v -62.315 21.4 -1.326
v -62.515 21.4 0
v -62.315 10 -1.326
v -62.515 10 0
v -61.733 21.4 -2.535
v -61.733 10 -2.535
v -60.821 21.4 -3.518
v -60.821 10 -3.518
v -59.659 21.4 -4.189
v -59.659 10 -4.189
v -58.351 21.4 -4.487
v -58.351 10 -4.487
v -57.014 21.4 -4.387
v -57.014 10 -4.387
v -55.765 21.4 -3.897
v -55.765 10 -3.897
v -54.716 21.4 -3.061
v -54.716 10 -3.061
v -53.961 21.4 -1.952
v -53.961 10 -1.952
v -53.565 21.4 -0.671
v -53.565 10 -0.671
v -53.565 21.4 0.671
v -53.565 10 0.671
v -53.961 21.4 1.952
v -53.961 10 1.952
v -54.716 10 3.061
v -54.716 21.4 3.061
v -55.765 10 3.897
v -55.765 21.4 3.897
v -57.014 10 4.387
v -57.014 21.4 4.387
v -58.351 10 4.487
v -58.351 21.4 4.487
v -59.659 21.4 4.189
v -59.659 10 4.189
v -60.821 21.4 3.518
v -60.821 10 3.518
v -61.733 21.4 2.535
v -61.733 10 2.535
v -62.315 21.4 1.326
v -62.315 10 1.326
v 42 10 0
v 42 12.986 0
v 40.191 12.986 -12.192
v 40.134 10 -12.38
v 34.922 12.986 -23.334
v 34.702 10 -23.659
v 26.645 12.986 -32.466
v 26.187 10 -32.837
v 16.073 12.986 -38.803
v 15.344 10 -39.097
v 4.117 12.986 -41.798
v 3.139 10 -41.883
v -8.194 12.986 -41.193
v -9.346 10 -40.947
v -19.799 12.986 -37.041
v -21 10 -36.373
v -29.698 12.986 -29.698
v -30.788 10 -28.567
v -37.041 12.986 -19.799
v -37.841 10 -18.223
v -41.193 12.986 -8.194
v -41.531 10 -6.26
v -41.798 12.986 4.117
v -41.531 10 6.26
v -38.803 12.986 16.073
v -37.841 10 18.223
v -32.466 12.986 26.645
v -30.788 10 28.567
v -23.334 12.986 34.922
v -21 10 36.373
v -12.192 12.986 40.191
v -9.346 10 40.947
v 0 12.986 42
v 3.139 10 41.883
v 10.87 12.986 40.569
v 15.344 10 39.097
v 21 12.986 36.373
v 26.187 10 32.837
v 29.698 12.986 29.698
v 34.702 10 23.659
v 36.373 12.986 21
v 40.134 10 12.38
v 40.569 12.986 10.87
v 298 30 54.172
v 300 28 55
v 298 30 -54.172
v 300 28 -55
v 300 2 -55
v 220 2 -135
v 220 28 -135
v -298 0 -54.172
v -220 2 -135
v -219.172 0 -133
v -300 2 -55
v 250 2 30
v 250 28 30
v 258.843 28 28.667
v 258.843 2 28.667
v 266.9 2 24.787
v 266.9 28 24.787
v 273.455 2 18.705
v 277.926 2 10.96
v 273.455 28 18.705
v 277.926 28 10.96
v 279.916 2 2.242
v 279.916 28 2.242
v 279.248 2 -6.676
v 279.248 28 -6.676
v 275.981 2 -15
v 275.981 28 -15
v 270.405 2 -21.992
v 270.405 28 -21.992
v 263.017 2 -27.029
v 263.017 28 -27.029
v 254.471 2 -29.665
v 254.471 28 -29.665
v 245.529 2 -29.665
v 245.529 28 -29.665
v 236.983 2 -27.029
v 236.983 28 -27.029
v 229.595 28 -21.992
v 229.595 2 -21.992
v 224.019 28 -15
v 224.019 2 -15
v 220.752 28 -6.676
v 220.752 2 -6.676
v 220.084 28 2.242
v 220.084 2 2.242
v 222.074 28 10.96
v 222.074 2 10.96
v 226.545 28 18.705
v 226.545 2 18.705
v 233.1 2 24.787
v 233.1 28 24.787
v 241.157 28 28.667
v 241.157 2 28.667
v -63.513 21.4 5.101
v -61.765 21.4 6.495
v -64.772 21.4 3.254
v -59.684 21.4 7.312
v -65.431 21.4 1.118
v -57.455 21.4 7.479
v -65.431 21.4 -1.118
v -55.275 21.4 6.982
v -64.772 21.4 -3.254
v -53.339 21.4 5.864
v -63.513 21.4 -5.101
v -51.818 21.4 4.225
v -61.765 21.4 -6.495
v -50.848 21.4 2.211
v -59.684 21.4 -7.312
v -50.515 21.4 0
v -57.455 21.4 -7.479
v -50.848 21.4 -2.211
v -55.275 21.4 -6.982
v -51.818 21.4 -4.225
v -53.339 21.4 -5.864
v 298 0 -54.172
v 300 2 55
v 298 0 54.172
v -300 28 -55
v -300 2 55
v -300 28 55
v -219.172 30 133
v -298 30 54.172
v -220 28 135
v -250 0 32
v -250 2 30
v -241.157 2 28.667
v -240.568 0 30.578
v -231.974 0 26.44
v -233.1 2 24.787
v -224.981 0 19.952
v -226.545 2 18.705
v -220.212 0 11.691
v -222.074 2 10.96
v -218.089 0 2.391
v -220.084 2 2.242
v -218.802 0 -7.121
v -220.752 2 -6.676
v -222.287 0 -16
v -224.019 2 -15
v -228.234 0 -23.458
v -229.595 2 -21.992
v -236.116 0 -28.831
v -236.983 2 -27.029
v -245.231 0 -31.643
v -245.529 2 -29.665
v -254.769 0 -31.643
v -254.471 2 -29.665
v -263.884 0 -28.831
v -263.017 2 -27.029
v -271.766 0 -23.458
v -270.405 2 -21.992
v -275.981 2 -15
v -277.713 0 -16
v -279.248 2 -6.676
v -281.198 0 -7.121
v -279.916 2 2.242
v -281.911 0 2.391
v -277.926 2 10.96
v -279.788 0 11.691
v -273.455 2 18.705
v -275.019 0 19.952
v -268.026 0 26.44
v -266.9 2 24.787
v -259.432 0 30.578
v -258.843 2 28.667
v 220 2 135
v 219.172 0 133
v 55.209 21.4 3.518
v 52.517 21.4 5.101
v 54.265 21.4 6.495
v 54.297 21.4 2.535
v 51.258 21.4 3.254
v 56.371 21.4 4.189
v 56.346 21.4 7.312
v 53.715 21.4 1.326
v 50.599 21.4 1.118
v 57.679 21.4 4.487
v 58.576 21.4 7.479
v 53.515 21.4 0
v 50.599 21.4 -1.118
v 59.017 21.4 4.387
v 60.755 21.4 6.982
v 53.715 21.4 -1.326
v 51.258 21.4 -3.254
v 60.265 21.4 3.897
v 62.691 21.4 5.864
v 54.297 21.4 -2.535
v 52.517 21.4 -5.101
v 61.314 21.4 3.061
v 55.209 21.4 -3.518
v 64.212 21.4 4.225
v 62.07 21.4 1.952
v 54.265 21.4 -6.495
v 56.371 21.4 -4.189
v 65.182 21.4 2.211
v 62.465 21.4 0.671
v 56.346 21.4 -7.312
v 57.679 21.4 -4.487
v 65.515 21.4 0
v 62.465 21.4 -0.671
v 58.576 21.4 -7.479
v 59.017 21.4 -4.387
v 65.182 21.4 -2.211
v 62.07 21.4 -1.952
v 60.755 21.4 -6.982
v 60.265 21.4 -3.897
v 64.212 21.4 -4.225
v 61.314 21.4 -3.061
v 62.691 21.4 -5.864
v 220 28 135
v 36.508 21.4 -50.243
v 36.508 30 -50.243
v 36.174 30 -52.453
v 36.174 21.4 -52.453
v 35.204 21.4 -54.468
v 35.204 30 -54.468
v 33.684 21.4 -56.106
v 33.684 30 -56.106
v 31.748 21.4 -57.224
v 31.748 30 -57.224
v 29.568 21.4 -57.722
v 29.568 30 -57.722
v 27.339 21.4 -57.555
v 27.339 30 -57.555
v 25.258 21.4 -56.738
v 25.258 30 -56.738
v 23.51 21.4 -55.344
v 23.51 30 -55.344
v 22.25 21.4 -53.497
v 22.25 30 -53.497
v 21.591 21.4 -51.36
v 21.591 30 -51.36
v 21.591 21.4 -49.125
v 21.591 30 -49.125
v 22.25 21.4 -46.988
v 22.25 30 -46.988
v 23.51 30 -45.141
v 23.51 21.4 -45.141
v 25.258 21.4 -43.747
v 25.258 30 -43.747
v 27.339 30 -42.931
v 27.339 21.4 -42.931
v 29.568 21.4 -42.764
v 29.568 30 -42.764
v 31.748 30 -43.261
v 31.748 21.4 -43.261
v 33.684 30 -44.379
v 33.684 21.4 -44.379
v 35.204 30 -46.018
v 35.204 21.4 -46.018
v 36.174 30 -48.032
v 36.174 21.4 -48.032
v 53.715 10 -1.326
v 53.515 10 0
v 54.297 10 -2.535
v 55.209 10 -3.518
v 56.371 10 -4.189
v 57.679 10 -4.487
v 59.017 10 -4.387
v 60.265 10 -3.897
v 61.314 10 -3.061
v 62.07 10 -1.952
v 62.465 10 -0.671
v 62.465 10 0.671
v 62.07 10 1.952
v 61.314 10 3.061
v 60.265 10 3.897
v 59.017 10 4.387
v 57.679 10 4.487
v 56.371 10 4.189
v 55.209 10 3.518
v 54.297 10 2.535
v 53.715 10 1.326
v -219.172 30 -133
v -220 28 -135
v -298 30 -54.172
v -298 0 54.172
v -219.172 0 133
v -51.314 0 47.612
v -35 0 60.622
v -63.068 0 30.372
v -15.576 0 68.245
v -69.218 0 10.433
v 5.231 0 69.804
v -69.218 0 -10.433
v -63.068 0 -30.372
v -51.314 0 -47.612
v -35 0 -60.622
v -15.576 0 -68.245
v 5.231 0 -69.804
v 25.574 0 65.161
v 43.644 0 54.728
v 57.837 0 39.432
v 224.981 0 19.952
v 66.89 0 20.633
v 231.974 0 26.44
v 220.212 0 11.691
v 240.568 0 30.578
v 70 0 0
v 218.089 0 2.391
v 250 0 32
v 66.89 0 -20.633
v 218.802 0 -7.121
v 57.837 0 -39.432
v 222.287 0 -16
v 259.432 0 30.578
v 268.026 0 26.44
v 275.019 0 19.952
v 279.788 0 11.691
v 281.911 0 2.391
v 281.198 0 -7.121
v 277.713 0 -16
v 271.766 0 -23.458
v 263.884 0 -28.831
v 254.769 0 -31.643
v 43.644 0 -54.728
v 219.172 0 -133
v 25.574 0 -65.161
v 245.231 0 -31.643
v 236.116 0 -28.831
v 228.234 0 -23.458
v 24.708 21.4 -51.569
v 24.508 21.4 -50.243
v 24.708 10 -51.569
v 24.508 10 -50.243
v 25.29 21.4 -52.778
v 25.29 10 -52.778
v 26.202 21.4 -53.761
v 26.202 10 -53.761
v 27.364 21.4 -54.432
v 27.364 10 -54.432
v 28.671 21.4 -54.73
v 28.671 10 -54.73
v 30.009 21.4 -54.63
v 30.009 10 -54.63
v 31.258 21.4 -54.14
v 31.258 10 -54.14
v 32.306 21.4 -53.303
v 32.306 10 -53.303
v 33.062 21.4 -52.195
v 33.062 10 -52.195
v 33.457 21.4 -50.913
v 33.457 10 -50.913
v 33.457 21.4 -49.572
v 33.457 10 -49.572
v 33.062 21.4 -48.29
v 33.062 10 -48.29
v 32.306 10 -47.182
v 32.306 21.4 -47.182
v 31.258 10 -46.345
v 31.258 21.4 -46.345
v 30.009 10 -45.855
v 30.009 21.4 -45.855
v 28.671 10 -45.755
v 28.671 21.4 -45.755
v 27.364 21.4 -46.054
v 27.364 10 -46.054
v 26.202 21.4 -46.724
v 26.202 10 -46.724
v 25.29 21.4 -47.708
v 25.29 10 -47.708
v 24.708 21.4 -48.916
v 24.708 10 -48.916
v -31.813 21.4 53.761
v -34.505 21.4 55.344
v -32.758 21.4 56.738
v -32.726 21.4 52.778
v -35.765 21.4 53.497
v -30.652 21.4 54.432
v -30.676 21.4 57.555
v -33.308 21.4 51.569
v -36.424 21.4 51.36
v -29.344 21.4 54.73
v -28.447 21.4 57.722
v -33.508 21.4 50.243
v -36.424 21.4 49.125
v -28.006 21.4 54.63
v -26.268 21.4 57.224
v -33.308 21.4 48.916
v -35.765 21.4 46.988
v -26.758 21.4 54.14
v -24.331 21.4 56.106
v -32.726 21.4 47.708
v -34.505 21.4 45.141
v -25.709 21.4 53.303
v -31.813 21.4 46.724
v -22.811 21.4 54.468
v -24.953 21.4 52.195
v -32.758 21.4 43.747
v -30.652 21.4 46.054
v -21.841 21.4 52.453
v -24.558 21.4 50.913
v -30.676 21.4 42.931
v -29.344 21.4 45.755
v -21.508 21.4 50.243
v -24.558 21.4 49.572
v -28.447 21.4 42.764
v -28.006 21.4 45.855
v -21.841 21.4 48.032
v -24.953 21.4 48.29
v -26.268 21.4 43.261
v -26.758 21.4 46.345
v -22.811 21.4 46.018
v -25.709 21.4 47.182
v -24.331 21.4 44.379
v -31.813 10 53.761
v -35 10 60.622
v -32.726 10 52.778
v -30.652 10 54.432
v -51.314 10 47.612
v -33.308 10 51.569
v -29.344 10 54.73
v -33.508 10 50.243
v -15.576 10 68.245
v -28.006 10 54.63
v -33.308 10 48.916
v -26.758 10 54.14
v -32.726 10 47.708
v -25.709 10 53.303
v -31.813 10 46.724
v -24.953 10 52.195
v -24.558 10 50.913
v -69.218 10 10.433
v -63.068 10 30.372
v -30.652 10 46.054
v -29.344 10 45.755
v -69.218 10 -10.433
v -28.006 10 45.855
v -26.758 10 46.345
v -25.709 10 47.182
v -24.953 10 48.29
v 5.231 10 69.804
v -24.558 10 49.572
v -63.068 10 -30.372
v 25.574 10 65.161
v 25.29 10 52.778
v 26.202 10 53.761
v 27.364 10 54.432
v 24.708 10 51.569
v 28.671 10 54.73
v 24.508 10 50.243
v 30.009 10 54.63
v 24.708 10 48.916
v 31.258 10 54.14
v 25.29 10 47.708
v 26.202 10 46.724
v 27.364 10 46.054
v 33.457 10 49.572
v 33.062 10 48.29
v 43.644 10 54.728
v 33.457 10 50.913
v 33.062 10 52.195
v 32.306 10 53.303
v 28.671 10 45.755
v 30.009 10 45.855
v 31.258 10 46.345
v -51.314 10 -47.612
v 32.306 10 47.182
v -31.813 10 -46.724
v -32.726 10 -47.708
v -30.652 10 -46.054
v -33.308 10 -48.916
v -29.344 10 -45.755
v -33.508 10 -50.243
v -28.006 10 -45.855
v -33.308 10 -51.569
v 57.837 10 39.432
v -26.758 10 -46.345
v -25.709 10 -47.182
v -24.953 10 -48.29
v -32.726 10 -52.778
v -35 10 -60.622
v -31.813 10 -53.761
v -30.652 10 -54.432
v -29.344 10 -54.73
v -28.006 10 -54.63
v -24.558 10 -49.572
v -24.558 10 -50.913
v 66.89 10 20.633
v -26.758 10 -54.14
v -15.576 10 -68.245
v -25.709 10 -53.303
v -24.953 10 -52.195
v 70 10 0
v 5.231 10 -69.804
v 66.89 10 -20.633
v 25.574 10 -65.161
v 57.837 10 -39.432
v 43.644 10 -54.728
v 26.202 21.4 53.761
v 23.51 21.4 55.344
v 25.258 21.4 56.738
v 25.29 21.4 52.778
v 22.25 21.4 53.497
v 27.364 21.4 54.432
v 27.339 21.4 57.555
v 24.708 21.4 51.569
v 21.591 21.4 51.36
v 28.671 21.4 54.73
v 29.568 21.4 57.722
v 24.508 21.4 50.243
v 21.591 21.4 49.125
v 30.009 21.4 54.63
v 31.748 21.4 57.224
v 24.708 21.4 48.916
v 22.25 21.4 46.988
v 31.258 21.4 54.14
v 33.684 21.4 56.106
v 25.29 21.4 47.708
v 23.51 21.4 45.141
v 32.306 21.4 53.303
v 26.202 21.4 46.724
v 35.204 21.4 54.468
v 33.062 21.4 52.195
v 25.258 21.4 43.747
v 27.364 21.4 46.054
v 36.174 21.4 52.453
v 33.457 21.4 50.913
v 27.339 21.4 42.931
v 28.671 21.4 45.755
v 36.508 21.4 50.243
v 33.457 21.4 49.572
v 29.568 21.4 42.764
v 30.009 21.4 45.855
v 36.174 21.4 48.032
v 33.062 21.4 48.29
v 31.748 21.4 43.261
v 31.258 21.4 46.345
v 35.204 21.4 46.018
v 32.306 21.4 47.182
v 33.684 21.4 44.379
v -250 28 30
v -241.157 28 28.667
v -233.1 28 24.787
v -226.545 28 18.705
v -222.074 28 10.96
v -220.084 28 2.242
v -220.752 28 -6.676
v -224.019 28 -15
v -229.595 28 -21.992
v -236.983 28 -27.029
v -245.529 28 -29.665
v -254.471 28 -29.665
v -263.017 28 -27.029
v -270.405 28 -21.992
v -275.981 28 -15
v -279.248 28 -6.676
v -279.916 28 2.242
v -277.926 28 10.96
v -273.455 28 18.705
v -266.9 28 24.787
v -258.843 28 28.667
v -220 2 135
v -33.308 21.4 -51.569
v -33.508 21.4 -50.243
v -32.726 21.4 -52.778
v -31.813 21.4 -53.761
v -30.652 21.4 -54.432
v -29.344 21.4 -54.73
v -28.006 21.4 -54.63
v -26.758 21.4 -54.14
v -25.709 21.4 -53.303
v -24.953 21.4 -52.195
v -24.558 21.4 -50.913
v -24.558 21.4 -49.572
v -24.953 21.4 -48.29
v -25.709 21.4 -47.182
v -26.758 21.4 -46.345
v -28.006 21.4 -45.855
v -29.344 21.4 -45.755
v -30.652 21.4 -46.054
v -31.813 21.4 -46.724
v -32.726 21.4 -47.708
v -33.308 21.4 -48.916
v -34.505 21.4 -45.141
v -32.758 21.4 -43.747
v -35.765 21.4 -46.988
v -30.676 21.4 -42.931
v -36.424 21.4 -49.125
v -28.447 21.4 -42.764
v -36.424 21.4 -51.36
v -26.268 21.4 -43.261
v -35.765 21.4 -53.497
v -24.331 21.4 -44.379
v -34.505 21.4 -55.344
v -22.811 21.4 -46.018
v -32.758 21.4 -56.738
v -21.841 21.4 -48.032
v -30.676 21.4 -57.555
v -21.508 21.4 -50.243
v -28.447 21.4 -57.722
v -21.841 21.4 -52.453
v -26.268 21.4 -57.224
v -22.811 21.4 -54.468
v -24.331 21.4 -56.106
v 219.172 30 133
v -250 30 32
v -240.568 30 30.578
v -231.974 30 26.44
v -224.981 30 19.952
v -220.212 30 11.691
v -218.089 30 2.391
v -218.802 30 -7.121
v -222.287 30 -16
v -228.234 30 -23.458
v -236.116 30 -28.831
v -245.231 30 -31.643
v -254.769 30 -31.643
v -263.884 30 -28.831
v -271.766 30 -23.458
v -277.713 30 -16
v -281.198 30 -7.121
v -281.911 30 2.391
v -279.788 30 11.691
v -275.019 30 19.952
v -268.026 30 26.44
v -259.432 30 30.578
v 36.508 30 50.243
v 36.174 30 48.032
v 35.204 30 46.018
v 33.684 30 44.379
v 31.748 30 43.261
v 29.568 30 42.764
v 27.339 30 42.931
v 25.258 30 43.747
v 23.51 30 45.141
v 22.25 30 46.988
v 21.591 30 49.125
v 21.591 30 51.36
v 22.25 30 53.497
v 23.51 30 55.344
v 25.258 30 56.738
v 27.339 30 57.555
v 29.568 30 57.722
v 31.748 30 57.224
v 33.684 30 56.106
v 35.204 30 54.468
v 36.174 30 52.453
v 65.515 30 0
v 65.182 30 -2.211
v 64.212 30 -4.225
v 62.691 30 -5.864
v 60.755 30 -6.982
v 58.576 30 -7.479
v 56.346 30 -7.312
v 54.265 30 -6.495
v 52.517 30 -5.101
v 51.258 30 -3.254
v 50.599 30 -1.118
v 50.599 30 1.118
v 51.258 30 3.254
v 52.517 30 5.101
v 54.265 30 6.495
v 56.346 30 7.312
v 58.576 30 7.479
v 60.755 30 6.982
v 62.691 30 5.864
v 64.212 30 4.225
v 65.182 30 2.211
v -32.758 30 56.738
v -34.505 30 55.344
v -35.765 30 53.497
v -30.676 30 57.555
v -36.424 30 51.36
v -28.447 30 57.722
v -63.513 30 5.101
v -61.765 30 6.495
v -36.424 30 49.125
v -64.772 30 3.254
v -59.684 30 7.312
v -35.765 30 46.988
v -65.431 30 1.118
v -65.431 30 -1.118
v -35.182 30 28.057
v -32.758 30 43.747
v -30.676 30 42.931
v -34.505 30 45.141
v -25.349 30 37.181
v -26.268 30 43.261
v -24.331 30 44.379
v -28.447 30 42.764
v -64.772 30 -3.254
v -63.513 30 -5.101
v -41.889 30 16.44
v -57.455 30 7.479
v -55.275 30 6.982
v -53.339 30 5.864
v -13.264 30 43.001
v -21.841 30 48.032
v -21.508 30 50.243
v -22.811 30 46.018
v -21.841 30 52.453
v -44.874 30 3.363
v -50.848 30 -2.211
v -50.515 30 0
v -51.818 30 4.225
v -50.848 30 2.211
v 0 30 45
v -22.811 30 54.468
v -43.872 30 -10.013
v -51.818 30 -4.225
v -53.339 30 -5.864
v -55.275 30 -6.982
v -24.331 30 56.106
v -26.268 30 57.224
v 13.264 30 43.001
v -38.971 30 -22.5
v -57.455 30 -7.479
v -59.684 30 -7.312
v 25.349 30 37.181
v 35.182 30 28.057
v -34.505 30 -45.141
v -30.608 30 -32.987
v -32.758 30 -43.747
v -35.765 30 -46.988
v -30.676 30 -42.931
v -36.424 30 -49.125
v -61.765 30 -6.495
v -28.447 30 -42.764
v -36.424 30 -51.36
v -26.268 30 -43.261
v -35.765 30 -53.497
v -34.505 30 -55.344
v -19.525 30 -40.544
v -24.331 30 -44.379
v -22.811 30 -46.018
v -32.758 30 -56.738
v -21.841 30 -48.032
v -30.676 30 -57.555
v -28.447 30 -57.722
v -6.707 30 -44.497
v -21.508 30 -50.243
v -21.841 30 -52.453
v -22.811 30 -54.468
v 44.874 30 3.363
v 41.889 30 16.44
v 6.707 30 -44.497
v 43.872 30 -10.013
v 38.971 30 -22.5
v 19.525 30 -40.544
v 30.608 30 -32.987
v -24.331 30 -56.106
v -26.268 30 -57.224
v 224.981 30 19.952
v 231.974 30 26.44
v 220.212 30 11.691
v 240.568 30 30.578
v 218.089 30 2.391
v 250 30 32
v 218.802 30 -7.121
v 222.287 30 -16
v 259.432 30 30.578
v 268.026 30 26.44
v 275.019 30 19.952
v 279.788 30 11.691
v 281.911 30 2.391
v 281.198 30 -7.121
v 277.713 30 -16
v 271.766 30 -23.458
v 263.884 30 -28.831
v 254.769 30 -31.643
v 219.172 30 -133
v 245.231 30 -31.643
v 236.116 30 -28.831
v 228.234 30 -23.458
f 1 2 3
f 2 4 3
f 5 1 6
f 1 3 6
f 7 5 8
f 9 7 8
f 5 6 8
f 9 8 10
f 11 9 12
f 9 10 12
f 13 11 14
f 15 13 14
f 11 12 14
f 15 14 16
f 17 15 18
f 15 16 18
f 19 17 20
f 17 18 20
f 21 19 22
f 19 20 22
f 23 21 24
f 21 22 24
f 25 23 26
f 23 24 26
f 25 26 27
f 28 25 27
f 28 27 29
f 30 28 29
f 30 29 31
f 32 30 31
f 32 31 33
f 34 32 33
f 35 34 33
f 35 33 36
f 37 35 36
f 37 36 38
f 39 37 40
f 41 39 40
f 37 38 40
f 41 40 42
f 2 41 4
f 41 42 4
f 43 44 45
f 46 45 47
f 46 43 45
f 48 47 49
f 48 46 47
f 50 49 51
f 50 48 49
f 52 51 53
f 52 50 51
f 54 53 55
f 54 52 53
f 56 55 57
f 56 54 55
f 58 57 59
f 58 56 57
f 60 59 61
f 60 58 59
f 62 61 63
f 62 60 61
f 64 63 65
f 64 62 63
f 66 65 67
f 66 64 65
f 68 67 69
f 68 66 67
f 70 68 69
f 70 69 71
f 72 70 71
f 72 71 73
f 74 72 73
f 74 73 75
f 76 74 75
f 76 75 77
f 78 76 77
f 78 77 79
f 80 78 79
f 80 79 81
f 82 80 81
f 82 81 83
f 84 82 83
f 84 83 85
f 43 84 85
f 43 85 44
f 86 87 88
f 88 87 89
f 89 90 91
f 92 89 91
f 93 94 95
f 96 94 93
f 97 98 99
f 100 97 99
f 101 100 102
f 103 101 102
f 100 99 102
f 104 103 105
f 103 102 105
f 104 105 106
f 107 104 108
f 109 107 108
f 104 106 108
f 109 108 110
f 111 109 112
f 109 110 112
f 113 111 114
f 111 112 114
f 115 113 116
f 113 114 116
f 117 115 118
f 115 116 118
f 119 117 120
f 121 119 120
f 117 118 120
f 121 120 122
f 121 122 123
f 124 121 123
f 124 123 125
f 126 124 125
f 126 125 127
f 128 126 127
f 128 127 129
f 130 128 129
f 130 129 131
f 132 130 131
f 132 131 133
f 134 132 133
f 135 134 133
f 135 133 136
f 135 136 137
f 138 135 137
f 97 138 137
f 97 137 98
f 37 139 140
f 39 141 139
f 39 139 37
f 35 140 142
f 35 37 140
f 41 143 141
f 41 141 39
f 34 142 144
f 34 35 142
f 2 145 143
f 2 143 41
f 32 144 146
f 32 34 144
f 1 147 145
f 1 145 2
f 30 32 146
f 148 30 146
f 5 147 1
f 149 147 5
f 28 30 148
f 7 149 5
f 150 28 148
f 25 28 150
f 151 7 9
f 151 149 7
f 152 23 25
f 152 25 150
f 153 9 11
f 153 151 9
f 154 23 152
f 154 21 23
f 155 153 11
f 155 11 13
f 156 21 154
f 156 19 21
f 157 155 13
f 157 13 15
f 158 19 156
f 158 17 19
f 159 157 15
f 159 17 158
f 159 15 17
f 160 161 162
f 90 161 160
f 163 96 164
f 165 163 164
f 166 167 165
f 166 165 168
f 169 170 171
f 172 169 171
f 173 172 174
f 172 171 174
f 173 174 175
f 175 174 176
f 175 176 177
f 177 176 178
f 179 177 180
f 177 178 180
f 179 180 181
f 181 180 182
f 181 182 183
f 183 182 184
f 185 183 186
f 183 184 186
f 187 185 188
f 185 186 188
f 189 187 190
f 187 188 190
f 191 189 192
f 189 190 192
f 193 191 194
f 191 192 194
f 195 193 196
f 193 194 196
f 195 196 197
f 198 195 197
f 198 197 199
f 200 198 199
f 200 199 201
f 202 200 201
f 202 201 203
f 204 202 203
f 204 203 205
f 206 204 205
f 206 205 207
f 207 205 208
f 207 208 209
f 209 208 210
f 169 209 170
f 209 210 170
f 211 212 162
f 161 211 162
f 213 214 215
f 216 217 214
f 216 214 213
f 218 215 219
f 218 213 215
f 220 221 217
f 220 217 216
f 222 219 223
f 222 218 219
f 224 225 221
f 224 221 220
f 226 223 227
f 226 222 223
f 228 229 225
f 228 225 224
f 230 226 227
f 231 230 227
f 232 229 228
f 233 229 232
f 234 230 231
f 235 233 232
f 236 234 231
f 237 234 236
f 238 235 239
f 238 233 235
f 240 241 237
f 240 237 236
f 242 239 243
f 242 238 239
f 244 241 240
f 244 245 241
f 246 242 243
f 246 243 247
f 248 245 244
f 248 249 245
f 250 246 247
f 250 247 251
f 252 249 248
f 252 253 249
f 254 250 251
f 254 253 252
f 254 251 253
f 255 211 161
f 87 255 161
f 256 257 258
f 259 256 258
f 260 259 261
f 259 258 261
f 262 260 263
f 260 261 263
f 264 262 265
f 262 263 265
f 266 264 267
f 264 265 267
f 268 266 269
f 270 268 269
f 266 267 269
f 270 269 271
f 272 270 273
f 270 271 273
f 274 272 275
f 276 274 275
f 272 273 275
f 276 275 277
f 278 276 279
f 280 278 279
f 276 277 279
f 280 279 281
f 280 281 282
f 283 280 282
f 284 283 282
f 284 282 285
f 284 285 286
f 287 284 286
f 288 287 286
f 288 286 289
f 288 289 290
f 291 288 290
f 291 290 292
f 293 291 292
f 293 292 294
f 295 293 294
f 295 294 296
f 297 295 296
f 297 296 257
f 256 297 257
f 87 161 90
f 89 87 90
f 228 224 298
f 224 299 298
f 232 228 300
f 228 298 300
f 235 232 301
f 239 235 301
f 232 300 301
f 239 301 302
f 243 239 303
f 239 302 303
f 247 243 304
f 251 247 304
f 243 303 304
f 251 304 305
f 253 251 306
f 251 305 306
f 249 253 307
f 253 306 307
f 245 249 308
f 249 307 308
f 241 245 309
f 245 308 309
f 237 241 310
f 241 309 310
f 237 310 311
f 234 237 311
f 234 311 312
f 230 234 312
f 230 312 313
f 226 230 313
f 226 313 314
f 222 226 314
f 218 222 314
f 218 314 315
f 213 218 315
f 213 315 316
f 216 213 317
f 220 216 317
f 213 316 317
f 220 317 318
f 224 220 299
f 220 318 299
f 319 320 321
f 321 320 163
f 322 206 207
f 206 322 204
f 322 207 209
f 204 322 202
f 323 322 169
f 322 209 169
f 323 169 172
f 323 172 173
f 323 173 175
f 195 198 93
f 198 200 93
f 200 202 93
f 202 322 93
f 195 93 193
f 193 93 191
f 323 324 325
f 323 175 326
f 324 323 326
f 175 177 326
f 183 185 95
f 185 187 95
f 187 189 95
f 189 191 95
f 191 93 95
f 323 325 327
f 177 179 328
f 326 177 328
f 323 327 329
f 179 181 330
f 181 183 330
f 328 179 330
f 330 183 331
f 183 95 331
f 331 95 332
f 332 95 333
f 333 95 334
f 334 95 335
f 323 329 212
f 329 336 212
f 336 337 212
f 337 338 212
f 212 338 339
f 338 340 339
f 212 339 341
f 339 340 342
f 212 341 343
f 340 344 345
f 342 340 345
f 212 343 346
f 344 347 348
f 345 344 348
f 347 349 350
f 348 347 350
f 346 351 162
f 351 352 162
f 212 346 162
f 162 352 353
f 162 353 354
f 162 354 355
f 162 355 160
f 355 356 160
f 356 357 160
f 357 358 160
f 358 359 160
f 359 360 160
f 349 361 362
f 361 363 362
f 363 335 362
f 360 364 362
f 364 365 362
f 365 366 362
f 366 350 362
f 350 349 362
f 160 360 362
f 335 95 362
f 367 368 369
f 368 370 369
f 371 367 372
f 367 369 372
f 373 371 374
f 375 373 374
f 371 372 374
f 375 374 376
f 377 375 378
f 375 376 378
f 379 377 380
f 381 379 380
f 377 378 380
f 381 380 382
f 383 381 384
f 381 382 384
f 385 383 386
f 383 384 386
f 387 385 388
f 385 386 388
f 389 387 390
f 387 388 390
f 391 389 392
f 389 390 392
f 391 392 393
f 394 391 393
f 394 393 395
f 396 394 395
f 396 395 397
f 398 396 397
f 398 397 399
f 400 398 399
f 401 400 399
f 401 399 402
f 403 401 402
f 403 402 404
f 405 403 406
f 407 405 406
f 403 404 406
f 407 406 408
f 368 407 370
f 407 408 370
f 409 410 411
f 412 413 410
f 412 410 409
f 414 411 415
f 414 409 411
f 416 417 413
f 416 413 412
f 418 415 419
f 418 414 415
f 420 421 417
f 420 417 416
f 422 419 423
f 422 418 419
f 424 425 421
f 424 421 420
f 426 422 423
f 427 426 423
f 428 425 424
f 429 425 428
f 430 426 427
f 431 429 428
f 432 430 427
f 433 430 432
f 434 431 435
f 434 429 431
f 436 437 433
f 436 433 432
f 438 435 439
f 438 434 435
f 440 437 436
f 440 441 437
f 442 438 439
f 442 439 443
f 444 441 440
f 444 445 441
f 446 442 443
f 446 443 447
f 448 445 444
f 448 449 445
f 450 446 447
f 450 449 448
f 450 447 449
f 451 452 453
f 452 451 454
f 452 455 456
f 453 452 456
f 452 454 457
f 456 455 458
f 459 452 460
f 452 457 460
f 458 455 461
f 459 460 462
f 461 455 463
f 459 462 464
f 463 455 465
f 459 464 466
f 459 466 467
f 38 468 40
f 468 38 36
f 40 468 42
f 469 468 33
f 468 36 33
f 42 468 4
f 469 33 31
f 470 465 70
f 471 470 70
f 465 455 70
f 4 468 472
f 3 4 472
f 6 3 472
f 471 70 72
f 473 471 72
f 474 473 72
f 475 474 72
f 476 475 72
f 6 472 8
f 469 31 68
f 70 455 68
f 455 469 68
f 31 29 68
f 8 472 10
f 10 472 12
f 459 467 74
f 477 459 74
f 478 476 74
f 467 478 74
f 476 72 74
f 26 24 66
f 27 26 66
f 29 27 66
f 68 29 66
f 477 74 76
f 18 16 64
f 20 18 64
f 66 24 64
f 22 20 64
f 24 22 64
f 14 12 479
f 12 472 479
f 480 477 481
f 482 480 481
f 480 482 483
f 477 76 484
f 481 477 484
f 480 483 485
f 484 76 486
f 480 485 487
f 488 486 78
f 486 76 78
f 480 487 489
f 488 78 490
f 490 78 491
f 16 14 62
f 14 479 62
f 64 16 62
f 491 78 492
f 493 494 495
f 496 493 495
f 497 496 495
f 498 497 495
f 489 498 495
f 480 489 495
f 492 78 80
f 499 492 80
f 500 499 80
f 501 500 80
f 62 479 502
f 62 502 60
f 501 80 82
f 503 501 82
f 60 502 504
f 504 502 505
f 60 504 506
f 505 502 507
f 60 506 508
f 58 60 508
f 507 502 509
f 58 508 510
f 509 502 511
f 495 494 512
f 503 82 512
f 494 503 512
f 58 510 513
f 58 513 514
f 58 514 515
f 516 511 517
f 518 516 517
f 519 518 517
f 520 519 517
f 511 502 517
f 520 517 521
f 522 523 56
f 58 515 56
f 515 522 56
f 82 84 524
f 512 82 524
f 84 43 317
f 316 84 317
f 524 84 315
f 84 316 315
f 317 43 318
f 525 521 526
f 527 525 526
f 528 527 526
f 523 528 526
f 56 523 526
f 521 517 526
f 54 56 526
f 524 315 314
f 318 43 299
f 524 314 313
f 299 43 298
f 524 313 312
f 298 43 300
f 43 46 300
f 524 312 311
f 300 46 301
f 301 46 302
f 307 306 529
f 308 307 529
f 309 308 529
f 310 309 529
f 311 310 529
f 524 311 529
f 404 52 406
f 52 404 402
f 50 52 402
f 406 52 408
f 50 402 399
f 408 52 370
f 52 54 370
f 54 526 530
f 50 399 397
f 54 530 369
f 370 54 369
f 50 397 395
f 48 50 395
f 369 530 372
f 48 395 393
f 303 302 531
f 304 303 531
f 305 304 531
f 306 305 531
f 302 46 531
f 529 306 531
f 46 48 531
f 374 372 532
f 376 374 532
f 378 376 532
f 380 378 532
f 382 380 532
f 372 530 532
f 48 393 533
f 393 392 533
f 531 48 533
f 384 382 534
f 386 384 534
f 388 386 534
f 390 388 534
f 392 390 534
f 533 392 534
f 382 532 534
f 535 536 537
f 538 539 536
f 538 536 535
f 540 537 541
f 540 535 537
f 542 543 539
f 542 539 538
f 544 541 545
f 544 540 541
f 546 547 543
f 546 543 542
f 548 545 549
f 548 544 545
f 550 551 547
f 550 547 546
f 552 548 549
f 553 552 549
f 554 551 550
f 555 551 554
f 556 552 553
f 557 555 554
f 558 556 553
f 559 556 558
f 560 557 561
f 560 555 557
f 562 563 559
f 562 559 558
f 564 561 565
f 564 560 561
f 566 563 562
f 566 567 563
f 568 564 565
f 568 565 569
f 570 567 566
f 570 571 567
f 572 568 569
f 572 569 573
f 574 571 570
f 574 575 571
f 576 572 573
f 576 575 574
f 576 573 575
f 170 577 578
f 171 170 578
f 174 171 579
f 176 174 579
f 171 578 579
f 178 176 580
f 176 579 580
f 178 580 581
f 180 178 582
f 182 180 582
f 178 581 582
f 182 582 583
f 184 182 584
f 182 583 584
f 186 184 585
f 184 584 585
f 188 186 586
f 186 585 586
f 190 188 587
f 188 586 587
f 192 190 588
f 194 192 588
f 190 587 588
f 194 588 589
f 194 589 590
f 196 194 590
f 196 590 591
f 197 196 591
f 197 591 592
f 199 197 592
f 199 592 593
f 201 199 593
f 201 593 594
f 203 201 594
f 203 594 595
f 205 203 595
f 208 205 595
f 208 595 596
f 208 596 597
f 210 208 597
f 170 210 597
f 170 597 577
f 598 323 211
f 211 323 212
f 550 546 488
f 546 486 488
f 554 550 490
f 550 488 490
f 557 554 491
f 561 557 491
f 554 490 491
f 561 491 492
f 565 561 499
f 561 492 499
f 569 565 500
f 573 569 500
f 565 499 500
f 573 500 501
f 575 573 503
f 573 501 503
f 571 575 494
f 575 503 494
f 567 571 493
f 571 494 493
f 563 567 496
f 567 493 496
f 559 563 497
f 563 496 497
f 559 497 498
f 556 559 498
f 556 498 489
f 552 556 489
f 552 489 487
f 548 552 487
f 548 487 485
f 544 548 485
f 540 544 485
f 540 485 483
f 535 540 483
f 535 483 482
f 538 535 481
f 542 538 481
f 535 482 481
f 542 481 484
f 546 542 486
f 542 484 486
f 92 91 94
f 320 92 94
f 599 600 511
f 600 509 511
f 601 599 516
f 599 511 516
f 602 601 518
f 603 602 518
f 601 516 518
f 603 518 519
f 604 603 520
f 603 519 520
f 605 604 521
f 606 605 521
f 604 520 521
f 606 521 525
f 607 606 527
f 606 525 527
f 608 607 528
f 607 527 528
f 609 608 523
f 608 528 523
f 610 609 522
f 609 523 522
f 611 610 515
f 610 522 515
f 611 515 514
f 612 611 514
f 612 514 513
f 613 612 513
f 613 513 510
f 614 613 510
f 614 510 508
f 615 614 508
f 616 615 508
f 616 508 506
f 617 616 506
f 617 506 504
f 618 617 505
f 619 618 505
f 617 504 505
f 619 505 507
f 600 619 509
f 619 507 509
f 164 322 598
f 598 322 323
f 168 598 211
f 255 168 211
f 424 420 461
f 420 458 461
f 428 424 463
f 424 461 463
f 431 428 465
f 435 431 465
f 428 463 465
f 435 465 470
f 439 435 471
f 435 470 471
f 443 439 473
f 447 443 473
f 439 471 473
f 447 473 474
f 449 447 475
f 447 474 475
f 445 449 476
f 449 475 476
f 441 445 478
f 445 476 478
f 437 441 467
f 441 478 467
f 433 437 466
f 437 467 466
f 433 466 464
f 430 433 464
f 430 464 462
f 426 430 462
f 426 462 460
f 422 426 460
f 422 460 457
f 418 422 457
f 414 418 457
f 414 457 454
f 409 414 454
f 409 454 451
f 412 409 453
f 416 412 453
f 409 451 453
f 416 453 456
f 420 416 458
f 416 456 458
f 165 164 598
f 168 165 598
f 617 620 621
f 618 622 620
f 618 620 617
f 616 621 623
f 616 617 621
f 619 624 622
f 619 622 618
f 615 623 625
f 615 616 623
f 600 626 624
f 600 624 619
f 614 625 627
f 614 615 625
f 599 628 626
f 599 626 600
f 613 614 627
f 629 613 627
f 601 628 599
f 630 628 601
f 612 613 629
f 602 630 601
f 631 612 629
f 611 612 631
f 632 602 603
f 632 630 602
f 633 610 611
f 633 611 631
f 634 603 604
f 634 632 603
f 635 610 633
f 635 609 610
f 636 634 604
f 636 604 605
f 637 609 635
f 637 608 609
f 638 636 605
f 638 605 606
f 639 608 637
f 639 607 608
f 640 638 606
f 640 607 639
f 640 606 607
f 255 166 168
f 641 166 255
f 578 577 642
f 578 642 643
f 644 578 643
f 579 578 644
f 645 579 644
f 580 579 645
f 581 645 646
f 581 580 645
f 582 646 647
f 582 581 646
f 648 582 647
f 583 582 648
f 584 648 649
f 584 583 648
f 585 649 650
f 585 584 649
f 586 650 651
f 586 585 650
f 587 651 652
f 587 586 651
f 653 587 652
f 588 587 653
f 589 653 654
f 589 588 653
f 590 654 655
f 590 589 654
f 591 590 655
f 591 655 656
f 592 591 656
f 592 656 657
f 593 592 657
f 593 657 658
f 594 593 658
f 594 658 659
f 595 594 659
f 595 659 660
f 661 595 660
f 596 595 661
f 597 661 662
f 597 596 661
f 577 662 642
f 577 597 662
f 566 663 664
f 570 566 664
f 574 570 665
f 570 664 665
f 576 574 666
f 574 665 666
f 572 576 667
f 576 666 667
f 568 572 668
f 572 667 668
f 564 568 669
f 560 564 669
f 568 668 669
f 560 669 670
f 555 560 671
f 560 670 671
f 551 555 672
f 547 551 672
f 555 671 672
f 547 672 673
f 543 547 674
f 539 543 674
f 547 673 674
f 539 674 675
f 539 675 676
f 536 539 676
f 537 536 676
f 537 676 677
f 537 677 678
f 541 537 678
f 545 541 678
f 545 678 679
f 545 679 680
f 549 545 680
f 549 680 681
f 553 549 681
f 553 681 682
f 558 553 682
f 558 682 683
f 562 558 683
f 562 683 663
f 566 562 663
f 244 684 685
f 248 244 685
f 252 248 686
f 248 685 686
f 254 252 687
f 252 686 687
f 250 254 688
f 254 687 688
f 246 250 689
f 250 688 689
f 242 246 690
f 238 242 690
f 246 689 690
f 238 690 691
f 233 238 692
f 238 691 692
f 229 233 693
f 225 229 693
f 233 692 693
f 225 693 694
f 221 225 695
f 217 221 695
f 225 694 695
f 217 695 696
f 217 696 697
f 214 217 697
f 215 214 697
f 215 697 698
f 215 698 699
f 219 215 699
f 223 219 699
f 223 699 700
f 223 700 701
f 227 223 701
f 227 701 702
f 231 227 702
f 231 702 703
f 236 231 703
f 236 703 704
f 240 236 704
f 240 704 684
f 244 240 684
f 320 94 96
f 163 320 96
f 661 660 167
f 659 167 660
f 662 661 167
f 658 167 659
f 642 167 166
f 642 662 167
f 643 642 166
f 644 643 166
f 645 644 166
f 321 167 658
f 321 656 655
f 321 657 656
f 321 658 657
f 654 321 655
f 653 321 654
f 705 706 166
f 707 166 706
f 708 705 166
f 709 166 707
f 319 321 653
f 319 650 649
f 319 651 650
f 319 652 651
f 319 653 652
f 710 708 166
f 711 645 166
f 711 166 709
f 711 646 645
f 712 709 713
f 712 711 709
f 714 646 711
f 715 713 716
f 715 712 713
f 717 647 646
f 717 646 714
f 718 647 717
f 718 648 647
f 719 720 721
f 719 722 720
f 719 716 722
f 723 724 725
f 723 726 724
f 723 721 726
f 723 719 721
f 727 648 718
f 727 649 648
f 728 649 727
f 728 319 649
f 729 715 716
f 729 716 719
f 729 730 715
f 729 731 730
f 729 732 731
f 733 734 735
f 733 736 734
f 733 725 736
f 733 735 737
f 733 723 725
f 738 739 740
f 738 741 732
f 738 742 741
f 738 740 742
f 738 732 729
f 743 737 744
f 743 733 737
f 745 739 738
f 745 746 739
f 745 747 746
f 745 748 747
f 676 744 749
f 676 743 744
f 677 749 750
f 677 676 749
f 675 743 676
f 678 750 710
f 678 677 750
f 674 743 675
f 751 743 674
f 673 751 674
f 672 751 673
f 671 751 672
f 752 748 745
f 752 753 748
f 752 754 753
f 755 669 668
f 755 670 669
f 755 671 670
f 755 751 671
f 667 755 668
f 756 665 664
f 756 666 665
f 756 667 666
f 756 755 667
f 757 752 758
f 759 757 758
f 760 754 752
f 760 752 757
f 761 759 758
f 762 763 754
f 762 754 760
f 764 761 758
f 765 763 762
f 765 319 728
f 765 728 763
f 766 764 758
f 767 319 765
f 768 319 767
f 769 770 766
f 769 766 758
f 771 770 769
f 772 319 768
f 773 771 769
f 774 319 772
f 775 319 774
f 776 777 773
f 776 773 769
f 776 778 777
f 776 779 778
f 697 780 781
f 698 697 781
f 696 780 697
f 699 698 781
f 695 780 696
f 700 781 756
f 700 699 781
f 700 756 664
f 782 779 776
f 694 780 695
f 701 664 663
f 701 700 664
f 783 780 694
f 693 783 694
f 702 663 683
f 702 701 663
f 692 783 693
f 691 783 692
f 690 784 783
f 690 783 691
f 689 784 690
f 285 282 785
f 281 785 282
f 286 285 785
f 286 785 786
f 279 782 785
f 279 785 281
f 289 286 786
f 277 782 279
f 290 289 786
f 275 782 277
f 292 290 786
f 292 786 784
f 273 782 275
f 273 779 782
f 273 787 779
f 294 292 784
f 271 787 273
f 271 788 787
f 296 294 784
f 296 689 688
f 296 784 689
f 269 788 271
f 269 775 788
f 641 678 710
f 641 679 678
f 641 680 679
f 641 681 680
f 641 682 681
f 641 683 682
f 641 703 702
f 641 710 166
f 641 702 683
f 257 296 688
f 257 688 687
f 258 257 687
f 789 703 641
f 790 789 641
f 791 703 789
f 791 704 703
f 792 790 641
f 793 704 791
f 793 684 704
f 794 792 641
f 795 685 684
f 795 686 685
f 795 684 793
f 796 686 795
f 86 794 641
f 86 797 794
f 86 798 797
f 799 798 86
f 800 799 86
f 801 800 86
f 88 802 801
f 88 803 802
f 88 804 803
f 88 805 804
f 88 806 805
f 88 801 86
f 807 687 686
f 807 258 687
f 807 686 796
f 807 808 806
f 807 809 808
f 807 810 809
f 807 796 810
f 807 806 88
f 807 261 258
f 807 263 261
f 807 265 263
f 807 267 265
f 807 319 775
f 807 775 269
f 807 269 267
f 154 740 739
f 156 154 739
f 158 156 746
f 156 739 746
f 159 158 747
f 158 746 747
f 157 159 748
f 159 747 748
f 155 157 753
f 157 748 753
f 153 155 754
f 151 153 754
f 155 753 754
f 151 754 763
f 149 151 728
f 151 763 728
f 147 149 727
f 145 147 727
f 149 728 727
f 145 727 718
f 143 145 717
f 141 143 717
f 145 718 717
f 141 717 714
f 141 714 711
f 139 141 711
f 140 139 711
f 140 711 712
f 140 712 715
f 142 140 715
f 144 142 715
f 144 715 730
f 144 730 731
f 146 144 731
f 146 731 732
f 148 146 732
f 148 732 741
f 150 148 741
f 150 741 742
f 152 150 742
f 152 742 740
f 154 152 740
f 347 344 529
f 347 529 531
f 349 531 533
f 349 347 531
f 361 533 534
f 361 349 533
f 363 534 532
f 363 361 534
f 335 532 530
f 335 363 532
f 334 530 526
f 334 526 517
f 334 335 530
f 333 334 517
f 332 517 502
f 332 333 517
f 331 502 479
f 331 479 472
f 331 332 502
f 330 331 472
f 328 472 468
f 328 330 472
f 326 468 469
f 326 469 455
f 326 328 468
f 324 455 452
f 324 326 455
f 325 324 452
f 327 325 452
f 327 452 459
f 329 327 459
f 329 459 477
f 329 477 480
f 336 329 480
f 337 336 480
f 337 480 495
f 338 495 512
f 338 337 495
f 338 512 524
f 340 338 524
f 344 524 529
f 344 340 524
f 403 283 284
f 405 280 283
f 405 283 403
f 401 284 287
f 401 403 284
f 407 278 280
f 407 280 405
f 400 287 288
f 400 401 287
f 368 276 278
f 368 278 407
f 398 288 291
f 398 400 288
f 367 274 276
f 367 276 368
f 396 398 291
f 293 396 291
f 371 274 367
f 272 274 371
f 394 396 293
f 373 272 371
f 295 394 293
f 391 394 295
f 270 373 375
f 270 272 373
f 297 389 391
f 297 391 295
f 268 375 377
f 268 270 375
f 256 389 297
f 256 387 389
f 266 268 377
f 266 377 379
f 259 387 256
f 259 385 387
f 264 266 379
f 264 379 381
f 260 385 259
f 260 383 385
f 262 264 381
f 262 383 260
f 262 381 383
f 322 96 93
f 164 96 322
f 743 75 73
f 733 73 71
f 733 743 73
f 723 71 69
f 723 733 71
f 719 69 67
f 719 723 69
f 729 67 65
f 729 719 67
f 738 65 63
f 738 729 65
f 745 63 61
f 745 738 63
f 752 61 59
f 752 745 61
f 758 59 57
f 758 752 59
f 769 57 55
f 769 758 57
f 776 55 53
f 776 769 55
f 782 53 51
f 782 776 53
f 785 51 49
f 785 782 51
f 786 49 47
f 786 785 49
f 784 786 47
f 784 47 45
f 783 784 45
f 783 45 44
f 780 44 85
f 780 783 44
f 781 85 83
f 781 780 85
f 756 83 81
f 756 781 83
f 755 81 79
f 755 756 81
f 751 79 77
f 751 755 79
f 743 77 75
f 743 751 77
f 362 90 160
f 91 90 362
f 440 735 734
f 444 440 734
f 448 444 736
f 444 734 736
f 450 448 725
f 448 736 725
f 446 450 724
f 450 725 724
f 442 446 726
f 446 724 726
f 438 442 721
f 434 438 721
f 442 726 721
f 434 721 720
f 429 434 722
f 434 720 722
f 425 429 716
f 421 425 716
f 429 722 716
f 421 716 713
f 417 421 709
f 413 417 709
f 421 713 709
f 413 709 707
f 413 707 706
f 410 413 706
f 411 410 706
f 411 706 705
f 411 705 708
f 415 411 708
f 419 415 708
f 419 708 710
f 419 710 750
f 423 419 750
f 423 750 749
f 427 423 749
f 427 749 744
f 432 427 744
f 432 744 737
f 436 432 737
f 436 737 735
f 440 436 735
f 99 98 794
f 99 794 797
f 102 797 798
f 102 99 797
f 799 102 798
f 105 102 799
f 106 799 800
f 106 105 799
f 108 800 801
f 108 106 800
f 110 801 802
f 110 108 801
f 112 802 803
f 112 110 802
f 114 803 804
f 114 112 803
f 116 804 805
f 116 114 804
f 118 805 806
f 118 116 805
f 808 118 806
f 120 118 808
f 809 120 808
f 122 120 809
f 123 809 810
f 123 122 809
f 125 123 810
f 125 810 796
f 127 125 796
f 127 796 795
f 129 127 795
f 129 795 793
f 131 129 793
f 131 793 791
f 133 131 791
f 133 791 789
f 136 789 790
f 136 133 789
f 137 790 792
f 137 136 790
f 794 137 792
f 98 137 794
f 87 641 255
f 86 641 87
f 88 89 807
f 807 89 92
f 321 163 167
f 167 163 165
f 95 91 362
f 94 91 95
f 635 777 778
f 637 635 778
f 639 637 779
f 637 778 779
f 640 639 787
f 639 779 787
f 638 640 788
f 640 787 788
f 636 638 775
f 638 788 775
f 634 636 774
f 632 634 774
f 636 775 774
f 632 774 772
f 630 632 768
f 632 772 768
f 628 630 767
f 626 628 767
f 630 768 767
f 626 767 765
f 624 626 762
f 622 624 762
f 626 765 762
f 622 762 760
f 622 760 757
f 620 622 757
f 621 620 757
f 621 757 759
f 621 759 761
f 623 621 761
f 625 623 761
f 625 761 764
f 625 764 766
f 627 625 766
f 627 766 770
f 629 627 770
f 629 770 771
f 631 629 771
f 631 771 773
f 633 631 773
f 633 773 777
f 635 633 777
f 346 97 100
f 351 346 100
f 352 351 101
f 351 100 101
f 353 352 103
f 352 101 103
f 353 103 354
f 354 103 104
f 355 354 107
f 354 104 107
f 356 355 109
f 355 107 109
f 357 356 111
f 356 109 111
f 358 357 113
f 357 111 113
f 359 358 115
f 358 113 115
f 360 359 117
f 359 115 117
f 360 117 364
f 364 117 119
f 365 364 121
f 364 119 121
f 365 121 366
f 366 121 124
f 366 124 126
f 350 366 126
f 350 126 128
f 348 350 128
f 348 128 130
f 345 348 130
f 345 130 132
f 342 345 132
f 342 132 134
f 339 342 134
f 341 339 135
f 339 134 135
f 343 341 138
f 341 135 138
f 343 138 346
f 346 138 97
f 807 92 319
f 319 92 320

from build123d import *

# Parameters (mm, degrees)
WYCI_GNI_CIE1_DEPTH                                 = 30
WYCI_GNI_CIE2_REACH                                 = 332.341
SZKIC3_R                                            = 30
SFAZOWANIE1_SIZE                                    = 2
OTW_R2_OUTLINE_R                                    = 42
OTW_R2_DEPTH                                        = 12.986154641
OTW_R3_OUTLINE_R                                    = 70
OTW_R3_OUTLINE_R_2                                  = 42
OTW_R3_DEPTH                                        = 10
POG_BIENIE_WALCOWE_POD_M8_WKR_T_Z_BEM_W_D           = 9
POG_BIENIE_WALCOWE_POD_M8_WKR_T_Z_BEM_W_CBORE_D     = 15
POG_BIENIE_WALCOWE_POD_M8_WKR_T_Z_BEM_W_CBORE_DEPTH = 8.6


# Read off the part's stored shape, not the designer's step: Otwór2, Otwór3
with BuildPart() as part:
    # Szkic1 → Wyciągnięcie1 (new body)
    with BuildSketch(Plane(origin=(0, 0, 0), x_dir=(1, 0, 0), z_dir=(0, 1, 0))):
        Polygon((-220, -135), (220, -135), (300, -55), (300, 55), (220, 135), (-220, 135), (-300, 55), (-300, -55), align=None)
    extrude(amount=WYCI_GNI_CIE1_DEPTH)

    # Szkic3 → Wyciągnięcie2 (cut, up to next)
    with BuildSketch(Plane(origin=(0, 30, 0), x_dir=(1, 0, 0), z_dir=(0, 1, 0)), mode=Mode.PRIVATE) as wyci_gni_cie2_sk1:
        with Locations(Location((-250, 0, 0), (0, 0, 270))):
            Circle(SZKIC3_R)
    wyci_gni_cie2_tool1 = extrude(wyci_gni_cie2_sk1.sketch, amount=-WYCI_GNI_CIE2_REACH, mode=Mode.PRIVATE) & part.part
    # Szkic3 → Wyciągnięcie2 (cut, up to next)
    with BuildSketch(Plane(origin=(0, 30, 0), x_dir=(1, 0, 0), z_dir=(0, 1, 0)), mode=Mode.PRIVATE) as wyci_gni_cie2_sk2:
        with Locations(Location((250, 0, 0), (0, 0, 270))):
            Circle(SZKIC3_R)
    wyci_gni_cie2_tool2 = extrude(wyci_gni_cie2_sk2.sketch, amount=-WYCI_GNI_CIE2_REACH, mode=Mode.PRIVATE) & part.part
    add(wyci_gni_cie2_tool1.solids().sort_by_distance((-250, 30, 0))[0], mode=Mode.SUBTRACT)
    add(wyci_gni_cie2_tool2.solids().sort_by_distance((250, 30, 0))[0], mode=Mode.SUBTRACT)

    # Sfazowanie1
    sfazowanie1_edges = [part.edges().sort_by_distance(p)[0] for p in [
        (-260, 30, 95),
        (-300, 0, 0),
        (-260, 0, -95),
        (0, 30, 135),
        (260, 30, 95),
        (300, 30, 0),
        (260, 30, -95),
        (-250, 30, -30),
        (-250, 0, -30),
        (0, 30, -135),
        (250, 30, -30),
        (250, 0, -30),
        (-260, 30, -95),
        (-300, 30, 0),
        (0, 0, -135),
        (260, 0, -95),
        (300, 0, 0),
        (260, 0, 95),
        (0, 0, 135),
        (-260, 0, 95),
    ]]
    chamfer(sfazowanie1_edges, length=SFAZOWANIE1_SIZE)

    # Szkic6 → Otwór1 (revolve, cut)
    with BuildSketch(Plane(origin=(0, 30, 0), x_dir=(0, 0, 1), z_dir=(1, 0, 0))):
        Polygon((0, 0), (0, 30), (10, 30), (10, 198.494863687), (45, 0), align=None)
    revolve(axis=Axis((0, 36.445314094, 0), (0, -1, 0)), mode=Mode.SUBTRACT)

    # Otwór2 outline → Otwór2 (cut)
    with BuildSketch(Plane(origin=(0, 0, 0), x_dir=(1, 0, 0), z_dir=(0, 1, 0))):
        Circle(OTW_R2_OUTLINE_R)
    extrude(amount=OTW_R2_DEPTH, mode=Mode.SUBTRACT)

    # Otwór3 outline → Otwór3 (cut)
    with BuildSketch(Plane(origin=(0, 0, 0), x_dir=(1, 0, 0), z_dir=(0, 1, 0))):
        Circle(OTW_R3_OUTLINE_R)
        Circle(OTW_R3_OUTLINE_R_2, mode=Mode.SUBTRACT)
    extrude(amount=OTW_R3_DEPTH, mode=Mode.SUBTRACT)

    # Pogłębienie walcowe pod M8 Wkręt z łbem walcowym z gniazdem sześciokątnym1 (through all)
    with Locations(Plane(origin=(0, 30, 0), x_dir=(1, 0, 0), z_dir=(0, 1, 0))):
        with Locations((-58.015165068, 0), (-29.007582534, 50.242606754), (29.007582534, 50.242606754), (58.015165068, 0), (29.007582534, -50.242606754), (-29.007582534, -50.242606754)):
            CounterBoreHole(POG_BIENIE_WALCOWE_POD_M8_WKR_T_Z_BEM_W_D / 2, POG_BIENIE_WALCOWE_POD_M8_WKR_T_Z_BEM_W_CBORE_D / 2, POG_BIENIE_WALCOWE_POD_M8_WKR_T_Z_BEM_W_CBORE_DEPTH)


solid = part.part
